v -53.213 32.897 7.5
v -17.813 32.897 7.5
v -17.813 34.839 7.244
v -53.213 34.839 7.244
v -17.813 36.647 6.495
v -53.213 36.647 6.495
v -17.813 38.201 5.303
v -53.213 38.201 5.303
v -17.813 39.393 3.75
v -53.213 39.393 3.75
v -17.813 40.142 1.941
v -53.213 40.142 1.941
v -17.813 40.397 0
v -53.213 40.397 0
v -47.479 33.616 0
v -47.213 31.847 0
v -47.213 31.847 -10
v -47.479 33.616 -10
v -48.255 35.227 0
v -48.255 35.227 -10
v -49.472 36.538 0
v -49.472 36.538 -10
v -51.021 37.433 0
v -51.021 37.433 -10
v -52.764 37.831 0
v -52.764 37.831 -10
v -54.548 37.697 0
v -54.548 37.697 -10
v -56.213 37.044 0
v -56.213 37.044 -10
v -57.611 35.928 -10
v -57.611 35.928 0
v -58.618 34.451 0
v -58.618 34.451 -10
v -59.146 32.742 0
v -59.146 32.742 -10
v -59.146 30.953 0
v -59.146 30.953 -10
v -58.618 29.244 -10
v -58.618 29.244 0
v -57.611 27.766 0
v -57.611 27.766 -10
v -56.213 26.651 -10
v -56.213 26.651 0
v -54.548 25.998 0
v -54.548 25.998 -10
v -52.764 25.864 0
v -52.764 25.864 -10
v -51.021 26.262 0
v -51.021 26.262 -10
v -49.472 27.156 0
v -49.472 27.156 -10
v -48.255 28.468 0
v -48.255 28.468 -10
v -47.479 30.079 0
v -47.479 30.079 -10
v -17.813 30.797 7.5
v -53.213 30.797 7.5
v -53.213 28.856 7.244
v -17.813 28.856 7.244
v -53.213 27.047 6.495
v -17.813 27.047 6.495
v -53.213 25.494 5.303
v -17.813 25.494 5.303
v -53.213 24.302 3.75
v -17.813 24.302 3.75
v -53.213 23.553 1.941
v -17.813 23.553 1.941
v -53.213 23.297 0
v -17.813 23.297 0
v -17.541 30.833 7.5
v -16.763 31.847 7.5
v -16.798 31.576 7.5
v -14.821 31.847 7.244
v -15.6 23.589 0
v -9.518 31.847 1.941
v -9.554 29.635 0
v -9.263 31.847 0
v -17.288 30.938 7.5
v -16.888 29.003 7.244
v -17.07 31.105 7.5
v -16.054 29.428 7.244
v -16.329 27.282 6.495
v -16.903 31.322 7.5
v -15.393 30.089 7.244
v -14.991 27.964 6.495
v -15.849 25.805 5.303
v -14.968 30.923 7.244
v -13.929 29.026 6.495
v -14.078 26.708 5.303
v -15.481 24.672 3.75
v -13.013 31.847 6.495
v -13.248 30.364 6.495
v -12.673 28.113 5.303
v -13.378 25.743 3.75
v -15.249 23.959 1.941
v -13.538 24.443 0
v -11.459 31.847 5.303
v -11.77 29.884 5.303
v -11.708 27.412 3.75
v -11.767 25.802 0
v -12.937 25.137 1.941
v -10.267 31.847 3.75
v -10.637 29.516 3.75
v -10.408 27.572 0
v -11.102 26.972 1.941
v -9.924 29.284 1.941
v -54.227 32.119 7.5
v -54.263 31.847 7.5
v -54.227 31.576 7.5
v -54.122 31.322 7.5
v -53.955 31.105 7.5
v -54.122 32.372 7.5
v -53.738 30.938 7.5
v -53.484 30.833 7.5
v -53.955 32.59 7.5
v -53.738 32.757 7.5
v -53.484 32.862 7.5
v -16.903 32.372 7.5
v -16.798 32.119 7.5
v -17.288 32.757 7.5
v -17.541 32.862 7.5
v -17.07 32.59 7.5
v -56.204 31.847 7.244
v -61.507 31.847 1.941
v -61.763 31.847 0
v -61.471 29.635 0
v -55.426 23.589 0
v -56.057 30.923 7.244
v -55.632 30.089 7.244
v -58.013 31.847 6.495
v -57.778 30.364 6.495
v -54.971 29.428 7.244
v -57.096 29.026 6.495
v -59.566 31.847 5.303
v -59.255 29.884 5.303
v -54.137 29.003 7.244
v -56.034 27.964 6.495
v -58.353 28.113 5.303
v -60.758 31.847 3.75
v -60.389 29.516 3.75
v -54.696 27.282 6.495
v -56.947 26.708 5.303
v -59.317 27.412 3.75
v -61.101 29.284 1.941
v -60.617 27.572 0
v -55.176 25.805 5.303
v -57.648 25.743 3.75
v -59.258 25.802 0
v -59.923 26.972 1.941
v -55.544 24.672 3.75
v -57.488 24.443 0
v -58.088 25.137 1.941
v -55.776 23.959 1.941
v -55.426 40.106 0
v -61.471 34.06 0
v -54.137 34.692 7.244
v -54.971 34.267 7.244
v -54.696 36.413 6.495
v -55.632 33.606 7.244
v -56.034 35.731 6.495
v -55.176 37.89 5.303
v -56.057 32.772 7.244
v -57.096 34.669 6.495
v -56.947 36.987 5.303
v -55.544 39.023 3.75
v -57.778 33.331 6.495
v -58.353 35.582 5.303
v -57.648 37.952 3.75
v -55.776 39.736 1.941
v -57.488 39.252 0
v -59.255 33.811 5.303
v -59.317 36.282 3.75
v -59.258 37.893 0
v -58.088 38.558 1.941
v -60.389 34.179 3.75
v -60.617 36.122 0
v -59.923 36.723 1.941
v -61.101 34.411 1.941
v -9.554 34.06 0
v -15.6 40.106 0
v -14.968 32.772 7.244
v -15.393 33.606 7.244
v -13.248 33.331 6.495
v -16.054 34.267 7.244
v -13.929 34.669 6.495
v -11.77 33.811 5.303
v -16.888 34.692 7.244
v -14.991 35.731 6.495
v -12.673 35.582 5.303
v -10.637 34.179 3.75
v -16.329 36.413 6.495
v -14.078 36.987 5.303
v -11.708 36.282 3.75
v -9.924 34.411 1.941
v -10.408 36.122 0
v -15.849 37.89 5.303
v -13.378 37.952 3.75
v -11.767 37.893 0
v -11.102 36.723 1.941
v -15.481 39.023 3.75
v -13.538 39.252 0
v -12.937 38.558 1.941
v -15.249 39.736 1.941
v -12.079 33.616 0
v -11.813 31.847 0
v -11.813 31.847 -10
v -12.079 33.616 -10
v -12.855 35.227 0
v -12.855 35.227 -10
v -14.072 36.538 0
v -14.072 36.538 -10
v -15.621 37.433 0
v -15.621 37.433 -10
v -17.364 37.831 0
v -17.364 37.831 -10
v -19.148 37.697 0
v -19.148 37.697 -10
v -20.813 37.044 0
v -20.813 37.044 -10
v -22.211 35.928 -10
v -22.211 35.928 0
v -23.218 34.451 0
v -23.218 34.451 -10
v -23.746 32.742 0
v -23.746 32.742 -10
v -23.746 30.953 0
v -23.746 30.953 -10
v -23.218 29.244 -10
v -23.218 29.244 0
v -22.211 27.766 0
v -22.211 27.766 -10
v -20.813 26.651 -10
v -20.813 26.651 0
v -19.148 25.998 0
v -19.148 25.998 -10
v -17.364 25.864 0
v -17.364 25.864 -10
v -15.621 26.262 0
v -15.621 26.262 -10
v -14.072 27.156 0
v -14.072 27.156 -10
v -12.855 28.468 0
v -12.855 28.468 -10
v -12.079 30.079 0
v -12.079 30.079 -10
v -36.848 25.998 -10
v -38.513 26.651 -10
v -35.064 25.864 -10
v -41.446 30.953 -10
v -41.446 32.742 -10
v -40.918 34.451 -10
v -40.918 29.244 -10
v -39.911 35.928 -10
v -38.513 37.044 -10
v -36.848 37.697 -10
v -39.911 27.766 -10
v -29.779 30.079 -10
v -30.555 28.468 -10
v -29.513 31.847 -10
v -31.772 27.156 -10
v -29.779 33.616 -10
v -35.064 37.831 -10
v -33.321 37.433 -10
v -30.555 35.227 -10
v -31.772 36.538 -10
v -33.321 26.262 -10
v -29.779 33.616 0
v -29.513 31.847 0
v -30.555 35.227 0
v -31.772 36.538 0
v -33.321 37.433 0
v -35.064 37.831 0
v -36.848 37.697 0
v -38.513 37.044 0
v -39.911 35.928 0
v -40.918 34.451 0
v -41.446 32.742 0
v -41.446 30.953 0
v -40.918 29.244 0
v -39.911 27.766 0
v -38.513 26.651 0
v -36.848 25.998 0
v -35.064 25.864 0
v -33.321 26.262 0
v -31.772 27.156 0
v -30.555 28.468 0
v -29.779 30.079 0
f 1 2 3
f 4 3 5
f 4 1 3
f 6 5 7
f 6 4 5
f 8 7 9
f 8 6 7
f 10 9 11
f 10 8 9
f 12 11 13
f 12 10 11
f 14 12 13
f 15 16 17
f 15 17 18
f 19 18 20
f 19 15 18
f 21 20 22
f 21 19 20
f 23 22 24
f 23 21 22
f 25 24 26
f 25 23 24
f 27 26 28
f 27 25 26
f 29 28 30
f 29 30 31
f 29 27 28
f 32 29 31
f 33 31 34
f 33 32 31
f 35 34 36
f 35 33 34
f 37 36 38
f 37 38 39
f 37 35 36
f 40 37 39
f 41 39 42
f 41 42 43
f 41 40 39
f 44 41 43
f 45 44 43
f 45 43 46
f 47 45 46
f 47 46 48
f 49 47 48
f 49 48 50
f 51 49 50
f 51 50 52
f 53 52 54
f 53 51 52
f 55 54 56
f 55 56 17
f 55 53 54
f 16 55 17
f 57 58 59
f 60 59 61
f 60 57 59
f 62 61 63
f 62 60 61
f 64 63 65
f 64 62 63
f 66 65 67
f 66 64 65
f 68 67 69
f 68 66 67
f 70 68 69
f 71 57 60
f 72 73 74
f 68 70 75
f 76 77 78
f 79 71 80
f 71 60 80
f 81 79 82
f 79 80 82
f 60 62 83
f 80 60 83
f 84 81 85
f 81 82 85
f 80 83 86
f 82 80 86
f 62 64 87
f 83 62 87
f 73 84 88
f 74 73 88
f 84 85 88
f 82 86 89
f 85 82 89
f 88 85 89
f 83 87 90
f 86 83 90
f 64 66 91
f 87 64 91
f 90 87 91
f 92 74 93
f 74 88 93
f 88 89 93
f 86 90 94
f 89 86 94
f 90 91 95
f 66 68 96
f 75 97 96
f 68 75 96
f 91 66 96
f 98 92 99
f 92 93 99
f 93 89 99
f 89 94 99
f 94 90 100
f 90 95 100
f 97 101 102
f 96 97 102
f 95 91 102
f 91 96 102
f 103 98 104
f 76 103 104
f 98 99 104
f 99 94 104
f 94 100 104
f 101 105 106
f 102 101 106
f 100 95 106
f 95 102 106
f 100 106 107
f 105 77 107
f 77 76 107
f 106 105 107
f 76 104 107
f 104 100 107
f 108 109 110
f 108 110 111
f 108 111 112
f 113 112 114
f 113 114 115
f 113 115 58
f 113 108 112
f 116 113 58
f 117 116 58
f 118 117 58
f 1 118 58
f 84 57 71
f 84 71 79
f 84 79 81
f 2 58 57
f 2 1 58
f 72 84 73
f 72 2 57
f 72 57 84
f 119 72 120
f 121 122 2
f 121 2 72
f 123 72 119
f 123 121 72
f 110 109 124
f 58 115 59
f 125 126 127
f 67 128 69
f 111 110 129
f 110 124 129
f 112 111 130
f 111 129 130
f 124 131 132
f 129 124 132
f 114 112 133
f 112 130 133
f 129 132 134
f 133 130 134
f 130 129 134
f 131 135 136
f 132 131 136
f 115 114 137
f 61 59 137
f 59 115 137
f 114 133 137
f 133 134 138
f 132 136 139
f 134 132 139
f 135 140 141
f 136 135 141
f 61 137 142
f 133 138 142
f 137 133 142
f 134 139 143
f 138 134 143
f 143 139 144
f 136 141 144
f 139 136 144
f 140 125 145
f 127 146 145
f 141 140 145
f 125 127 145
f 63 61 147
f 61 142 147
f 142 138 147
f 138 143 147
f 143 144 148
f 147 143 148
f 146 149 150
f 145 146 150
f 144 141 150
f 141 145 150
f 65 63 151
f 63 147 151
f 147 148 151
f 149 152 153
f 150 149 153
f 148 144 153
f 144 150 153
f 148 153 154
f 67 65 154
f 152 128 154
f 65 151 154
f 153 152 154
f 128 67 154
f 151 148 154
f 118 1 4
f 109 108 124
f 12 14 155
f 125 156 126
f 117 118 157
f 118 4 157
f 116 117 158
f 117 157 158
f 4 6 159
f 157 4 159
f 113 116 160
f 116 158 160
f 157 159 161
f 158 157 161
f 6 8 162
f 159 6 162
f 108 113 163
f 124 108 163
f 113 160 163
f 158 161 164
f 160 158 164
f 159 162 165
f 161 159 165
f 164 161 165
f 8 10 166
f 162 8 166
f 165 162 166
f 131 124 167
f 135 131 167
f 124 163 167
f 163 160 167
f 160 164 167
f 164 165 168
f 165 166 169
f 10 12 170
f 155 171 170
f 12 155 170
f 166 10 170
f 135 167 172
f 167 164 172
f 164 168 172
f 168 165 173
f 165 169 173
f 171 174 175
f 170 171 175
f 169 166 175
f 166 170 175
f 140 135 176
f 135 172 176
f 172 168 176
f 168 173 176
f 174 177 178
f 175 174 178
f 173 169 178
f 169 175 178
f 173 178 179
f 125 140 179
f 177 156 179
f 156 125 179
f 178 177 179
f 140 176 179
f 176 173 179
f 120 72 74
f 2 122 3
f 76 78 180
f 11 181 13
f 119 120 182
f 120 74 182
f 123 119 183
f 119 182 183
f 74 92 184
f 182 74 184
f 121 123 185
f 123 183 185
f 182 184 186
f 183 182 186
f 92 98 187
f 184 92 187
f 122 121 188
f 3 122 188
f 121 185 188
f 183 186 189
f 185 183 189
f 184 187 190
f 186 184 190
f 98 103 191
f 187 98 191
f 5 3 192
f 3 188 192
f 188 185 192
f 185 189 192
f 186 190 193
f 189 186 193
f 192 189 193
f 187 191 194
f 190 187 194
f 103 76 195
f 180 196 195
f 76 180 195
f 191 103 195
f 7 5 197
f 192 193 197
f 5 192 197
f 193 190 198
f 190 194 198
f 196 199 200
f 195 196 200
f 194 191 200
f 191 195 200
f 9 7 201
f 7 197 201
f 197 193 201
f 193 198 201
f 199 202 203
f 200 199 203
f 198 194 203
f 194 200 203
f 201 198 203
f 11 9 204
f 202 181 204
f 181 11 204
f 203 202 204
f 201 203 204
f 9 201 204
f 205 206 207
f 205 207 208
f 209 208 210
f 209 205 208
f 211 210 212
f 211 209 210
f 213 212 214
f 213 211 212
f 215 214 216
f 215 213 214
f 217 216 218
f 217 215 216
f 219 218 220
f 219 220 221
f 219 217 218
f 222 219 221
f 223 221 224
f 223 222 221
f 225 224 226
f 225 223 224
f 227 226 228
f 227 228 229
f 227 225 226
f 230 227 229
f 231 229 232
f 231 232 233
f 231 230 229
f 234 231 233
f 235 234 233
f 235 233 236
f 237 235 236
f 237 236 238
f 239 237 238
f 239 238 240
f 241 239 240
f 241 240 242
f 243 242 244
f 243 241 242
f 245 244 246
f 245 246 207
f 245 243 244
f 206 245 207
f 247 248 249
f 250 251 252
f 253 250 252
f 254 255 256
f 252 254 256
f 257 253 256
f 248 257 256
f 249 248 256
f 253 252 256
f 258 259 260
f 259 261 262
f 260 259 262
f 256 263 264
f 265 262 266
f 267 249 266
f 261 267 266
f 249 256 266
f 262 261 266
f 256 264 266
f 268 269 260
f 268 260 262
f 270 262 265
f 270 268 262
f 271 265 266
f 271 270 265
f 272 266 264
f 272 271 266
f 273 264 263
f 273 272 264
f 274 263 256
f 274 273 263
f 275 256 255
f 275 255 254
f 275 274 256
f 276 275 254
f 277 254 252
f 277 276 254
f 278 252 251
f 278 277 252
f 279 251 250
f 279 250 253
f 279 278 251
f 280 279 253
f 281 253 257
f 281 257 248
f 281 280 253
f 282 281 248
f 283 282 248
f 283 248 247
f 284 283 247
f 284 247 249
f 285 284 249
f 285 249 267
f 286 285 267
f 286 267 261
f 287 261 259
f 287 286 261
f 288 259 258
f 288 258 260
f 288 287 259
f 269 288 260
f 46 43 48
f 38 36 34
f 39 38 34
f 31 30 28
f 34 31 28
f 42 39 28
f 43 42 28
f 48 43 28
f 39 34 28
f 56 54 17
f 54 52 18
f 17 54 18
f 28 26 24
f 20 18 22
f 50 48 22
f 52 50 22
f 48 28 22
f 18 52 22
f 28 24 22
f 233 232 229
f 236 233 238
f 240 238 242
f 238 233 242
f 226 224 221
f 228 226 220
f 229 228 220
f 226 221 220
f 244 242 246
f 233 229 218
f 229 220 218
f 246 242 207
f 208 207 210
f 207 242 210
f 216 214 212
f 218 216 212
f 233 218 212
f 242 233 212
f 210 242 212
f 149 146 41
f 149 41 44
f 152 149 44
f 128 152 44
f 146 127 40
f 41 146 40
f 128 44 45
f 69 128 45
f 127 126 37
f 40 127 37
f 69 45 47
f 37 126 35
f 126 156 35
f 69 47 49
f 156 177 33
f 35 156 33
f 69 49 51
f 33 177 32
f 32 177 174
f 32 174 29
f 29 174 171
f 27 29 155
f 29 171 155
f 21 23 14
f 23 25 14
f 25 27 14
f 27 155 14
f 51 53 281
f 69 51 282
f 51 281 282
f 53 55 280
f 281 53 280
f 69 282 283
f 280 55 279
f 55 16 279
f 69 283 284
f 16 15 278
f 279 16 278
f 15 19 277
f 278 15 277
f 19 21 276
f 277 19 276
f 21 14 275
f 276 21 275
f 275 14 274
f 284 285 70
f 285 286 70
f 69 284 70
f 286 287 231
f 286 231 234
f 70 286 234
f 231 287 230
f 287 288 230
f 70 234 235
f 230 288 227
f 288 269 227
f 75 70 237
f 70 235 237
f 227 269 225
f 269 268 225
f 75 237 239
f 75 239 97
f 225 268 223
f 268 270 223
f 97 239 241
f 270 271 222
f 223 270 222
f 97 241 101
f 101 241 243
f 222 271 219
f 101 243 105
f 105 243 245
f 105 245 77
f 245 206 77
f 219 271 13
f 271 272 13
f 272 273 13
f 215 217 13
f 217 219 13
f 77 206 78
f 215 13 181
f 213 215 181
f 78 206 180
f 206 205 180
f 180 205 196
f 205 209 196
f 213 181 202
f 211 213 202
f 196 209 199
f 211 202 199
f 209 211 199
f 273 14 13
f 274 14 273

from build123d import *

# Parameters (mm, degrees)
F0_R     = 6
F1_DEPTH = 7.5
F2_DEPTH = 10
F3_R     = 7.49999


# Not quite as in the source:
# - a fillet or chamfer is up to 0.001 mm smaller than in the source, because OpenCascade refuses the exact size


with BuildPart() as f1:
    # F0 (on Top) → F1 (new body)
    with BuildSketch(Plane.XY):
        with BuildLine():
            Line((-17.8126084931, 40.3974354923), (-53.2126084931, 40.3974354923))
            ThreePointArc((-53.2126084931, 40.3974354923), (-59.2583714722, 37.8931984714), (-61.7626084931, 31.8474354923))
            ThreePointArc((-61.7626084931, 31.8474354923), (-59.2583714722, 25.8016725131), (-53.2126084931, 23.2974354923))
            Line((-53.2126084931, 23.2974354923), (-17.8126084931, 23.2974354923))
            ThreePointArc((-17.8126084931, 23.2974354923), (-11.7668455139, 25.8016725131), (-9.2626084931, 31.8474354923))
            ThreePointArc((-9.2626084931, 31.8474354923), (-11.7668455139, 37.8931984714), (-17.8126084931, 40.3974354923))
        make_face()
        with Locations((-53.2126084931, 31.8474354923)):
            Circle(F0_R, mode=Mode.SUBTRACT)
        with Locations((-35.5126084931, 31.8474354923)):
            Circle(F0_R, mode=Mode.SUBTRACT)
        with Locations((-17.8126084931, 31.8474354923)):
            Circle(F0_R, mode=Mode.SUBTRACT)
        with Locations((-53.2126084931, 31.8474354923)):
            Circle(F0_R)
        with Locations((-35.5126084931, 31.8474354923)):
            Circle(F0_R)
        with Locations((-17.8126084931, 31.8474354923)):
            Circle(F0_R)
    extrude(amount=F1_DEPTH)

    # F0 (on Top) → F2 (join)
    with BuildSketch(Plane.XY):
        with Locations((-53.2126084931, 31.8474354923)):
            Circle(F0_R)
        with Locations((-35.5126084931, 31.8474354923)):
            Circle(F0_R)
        with Locations((-17.8126084931, 31.8474354923)):
            Circle(F0_R)
    extrude(amount=-F2_DEPTH)

    # F3 (radius 7.5 in the source; OpenCascade refuses exactly that, so slightly less here)
    f3_edges = [f1.edges().sort_by_distance(p)[0] for p in [
        (-61.762608, 31.847435, 7.5),
    ]]
    fillet(f3_edges, radius=F3_R)


solid = f1.part
